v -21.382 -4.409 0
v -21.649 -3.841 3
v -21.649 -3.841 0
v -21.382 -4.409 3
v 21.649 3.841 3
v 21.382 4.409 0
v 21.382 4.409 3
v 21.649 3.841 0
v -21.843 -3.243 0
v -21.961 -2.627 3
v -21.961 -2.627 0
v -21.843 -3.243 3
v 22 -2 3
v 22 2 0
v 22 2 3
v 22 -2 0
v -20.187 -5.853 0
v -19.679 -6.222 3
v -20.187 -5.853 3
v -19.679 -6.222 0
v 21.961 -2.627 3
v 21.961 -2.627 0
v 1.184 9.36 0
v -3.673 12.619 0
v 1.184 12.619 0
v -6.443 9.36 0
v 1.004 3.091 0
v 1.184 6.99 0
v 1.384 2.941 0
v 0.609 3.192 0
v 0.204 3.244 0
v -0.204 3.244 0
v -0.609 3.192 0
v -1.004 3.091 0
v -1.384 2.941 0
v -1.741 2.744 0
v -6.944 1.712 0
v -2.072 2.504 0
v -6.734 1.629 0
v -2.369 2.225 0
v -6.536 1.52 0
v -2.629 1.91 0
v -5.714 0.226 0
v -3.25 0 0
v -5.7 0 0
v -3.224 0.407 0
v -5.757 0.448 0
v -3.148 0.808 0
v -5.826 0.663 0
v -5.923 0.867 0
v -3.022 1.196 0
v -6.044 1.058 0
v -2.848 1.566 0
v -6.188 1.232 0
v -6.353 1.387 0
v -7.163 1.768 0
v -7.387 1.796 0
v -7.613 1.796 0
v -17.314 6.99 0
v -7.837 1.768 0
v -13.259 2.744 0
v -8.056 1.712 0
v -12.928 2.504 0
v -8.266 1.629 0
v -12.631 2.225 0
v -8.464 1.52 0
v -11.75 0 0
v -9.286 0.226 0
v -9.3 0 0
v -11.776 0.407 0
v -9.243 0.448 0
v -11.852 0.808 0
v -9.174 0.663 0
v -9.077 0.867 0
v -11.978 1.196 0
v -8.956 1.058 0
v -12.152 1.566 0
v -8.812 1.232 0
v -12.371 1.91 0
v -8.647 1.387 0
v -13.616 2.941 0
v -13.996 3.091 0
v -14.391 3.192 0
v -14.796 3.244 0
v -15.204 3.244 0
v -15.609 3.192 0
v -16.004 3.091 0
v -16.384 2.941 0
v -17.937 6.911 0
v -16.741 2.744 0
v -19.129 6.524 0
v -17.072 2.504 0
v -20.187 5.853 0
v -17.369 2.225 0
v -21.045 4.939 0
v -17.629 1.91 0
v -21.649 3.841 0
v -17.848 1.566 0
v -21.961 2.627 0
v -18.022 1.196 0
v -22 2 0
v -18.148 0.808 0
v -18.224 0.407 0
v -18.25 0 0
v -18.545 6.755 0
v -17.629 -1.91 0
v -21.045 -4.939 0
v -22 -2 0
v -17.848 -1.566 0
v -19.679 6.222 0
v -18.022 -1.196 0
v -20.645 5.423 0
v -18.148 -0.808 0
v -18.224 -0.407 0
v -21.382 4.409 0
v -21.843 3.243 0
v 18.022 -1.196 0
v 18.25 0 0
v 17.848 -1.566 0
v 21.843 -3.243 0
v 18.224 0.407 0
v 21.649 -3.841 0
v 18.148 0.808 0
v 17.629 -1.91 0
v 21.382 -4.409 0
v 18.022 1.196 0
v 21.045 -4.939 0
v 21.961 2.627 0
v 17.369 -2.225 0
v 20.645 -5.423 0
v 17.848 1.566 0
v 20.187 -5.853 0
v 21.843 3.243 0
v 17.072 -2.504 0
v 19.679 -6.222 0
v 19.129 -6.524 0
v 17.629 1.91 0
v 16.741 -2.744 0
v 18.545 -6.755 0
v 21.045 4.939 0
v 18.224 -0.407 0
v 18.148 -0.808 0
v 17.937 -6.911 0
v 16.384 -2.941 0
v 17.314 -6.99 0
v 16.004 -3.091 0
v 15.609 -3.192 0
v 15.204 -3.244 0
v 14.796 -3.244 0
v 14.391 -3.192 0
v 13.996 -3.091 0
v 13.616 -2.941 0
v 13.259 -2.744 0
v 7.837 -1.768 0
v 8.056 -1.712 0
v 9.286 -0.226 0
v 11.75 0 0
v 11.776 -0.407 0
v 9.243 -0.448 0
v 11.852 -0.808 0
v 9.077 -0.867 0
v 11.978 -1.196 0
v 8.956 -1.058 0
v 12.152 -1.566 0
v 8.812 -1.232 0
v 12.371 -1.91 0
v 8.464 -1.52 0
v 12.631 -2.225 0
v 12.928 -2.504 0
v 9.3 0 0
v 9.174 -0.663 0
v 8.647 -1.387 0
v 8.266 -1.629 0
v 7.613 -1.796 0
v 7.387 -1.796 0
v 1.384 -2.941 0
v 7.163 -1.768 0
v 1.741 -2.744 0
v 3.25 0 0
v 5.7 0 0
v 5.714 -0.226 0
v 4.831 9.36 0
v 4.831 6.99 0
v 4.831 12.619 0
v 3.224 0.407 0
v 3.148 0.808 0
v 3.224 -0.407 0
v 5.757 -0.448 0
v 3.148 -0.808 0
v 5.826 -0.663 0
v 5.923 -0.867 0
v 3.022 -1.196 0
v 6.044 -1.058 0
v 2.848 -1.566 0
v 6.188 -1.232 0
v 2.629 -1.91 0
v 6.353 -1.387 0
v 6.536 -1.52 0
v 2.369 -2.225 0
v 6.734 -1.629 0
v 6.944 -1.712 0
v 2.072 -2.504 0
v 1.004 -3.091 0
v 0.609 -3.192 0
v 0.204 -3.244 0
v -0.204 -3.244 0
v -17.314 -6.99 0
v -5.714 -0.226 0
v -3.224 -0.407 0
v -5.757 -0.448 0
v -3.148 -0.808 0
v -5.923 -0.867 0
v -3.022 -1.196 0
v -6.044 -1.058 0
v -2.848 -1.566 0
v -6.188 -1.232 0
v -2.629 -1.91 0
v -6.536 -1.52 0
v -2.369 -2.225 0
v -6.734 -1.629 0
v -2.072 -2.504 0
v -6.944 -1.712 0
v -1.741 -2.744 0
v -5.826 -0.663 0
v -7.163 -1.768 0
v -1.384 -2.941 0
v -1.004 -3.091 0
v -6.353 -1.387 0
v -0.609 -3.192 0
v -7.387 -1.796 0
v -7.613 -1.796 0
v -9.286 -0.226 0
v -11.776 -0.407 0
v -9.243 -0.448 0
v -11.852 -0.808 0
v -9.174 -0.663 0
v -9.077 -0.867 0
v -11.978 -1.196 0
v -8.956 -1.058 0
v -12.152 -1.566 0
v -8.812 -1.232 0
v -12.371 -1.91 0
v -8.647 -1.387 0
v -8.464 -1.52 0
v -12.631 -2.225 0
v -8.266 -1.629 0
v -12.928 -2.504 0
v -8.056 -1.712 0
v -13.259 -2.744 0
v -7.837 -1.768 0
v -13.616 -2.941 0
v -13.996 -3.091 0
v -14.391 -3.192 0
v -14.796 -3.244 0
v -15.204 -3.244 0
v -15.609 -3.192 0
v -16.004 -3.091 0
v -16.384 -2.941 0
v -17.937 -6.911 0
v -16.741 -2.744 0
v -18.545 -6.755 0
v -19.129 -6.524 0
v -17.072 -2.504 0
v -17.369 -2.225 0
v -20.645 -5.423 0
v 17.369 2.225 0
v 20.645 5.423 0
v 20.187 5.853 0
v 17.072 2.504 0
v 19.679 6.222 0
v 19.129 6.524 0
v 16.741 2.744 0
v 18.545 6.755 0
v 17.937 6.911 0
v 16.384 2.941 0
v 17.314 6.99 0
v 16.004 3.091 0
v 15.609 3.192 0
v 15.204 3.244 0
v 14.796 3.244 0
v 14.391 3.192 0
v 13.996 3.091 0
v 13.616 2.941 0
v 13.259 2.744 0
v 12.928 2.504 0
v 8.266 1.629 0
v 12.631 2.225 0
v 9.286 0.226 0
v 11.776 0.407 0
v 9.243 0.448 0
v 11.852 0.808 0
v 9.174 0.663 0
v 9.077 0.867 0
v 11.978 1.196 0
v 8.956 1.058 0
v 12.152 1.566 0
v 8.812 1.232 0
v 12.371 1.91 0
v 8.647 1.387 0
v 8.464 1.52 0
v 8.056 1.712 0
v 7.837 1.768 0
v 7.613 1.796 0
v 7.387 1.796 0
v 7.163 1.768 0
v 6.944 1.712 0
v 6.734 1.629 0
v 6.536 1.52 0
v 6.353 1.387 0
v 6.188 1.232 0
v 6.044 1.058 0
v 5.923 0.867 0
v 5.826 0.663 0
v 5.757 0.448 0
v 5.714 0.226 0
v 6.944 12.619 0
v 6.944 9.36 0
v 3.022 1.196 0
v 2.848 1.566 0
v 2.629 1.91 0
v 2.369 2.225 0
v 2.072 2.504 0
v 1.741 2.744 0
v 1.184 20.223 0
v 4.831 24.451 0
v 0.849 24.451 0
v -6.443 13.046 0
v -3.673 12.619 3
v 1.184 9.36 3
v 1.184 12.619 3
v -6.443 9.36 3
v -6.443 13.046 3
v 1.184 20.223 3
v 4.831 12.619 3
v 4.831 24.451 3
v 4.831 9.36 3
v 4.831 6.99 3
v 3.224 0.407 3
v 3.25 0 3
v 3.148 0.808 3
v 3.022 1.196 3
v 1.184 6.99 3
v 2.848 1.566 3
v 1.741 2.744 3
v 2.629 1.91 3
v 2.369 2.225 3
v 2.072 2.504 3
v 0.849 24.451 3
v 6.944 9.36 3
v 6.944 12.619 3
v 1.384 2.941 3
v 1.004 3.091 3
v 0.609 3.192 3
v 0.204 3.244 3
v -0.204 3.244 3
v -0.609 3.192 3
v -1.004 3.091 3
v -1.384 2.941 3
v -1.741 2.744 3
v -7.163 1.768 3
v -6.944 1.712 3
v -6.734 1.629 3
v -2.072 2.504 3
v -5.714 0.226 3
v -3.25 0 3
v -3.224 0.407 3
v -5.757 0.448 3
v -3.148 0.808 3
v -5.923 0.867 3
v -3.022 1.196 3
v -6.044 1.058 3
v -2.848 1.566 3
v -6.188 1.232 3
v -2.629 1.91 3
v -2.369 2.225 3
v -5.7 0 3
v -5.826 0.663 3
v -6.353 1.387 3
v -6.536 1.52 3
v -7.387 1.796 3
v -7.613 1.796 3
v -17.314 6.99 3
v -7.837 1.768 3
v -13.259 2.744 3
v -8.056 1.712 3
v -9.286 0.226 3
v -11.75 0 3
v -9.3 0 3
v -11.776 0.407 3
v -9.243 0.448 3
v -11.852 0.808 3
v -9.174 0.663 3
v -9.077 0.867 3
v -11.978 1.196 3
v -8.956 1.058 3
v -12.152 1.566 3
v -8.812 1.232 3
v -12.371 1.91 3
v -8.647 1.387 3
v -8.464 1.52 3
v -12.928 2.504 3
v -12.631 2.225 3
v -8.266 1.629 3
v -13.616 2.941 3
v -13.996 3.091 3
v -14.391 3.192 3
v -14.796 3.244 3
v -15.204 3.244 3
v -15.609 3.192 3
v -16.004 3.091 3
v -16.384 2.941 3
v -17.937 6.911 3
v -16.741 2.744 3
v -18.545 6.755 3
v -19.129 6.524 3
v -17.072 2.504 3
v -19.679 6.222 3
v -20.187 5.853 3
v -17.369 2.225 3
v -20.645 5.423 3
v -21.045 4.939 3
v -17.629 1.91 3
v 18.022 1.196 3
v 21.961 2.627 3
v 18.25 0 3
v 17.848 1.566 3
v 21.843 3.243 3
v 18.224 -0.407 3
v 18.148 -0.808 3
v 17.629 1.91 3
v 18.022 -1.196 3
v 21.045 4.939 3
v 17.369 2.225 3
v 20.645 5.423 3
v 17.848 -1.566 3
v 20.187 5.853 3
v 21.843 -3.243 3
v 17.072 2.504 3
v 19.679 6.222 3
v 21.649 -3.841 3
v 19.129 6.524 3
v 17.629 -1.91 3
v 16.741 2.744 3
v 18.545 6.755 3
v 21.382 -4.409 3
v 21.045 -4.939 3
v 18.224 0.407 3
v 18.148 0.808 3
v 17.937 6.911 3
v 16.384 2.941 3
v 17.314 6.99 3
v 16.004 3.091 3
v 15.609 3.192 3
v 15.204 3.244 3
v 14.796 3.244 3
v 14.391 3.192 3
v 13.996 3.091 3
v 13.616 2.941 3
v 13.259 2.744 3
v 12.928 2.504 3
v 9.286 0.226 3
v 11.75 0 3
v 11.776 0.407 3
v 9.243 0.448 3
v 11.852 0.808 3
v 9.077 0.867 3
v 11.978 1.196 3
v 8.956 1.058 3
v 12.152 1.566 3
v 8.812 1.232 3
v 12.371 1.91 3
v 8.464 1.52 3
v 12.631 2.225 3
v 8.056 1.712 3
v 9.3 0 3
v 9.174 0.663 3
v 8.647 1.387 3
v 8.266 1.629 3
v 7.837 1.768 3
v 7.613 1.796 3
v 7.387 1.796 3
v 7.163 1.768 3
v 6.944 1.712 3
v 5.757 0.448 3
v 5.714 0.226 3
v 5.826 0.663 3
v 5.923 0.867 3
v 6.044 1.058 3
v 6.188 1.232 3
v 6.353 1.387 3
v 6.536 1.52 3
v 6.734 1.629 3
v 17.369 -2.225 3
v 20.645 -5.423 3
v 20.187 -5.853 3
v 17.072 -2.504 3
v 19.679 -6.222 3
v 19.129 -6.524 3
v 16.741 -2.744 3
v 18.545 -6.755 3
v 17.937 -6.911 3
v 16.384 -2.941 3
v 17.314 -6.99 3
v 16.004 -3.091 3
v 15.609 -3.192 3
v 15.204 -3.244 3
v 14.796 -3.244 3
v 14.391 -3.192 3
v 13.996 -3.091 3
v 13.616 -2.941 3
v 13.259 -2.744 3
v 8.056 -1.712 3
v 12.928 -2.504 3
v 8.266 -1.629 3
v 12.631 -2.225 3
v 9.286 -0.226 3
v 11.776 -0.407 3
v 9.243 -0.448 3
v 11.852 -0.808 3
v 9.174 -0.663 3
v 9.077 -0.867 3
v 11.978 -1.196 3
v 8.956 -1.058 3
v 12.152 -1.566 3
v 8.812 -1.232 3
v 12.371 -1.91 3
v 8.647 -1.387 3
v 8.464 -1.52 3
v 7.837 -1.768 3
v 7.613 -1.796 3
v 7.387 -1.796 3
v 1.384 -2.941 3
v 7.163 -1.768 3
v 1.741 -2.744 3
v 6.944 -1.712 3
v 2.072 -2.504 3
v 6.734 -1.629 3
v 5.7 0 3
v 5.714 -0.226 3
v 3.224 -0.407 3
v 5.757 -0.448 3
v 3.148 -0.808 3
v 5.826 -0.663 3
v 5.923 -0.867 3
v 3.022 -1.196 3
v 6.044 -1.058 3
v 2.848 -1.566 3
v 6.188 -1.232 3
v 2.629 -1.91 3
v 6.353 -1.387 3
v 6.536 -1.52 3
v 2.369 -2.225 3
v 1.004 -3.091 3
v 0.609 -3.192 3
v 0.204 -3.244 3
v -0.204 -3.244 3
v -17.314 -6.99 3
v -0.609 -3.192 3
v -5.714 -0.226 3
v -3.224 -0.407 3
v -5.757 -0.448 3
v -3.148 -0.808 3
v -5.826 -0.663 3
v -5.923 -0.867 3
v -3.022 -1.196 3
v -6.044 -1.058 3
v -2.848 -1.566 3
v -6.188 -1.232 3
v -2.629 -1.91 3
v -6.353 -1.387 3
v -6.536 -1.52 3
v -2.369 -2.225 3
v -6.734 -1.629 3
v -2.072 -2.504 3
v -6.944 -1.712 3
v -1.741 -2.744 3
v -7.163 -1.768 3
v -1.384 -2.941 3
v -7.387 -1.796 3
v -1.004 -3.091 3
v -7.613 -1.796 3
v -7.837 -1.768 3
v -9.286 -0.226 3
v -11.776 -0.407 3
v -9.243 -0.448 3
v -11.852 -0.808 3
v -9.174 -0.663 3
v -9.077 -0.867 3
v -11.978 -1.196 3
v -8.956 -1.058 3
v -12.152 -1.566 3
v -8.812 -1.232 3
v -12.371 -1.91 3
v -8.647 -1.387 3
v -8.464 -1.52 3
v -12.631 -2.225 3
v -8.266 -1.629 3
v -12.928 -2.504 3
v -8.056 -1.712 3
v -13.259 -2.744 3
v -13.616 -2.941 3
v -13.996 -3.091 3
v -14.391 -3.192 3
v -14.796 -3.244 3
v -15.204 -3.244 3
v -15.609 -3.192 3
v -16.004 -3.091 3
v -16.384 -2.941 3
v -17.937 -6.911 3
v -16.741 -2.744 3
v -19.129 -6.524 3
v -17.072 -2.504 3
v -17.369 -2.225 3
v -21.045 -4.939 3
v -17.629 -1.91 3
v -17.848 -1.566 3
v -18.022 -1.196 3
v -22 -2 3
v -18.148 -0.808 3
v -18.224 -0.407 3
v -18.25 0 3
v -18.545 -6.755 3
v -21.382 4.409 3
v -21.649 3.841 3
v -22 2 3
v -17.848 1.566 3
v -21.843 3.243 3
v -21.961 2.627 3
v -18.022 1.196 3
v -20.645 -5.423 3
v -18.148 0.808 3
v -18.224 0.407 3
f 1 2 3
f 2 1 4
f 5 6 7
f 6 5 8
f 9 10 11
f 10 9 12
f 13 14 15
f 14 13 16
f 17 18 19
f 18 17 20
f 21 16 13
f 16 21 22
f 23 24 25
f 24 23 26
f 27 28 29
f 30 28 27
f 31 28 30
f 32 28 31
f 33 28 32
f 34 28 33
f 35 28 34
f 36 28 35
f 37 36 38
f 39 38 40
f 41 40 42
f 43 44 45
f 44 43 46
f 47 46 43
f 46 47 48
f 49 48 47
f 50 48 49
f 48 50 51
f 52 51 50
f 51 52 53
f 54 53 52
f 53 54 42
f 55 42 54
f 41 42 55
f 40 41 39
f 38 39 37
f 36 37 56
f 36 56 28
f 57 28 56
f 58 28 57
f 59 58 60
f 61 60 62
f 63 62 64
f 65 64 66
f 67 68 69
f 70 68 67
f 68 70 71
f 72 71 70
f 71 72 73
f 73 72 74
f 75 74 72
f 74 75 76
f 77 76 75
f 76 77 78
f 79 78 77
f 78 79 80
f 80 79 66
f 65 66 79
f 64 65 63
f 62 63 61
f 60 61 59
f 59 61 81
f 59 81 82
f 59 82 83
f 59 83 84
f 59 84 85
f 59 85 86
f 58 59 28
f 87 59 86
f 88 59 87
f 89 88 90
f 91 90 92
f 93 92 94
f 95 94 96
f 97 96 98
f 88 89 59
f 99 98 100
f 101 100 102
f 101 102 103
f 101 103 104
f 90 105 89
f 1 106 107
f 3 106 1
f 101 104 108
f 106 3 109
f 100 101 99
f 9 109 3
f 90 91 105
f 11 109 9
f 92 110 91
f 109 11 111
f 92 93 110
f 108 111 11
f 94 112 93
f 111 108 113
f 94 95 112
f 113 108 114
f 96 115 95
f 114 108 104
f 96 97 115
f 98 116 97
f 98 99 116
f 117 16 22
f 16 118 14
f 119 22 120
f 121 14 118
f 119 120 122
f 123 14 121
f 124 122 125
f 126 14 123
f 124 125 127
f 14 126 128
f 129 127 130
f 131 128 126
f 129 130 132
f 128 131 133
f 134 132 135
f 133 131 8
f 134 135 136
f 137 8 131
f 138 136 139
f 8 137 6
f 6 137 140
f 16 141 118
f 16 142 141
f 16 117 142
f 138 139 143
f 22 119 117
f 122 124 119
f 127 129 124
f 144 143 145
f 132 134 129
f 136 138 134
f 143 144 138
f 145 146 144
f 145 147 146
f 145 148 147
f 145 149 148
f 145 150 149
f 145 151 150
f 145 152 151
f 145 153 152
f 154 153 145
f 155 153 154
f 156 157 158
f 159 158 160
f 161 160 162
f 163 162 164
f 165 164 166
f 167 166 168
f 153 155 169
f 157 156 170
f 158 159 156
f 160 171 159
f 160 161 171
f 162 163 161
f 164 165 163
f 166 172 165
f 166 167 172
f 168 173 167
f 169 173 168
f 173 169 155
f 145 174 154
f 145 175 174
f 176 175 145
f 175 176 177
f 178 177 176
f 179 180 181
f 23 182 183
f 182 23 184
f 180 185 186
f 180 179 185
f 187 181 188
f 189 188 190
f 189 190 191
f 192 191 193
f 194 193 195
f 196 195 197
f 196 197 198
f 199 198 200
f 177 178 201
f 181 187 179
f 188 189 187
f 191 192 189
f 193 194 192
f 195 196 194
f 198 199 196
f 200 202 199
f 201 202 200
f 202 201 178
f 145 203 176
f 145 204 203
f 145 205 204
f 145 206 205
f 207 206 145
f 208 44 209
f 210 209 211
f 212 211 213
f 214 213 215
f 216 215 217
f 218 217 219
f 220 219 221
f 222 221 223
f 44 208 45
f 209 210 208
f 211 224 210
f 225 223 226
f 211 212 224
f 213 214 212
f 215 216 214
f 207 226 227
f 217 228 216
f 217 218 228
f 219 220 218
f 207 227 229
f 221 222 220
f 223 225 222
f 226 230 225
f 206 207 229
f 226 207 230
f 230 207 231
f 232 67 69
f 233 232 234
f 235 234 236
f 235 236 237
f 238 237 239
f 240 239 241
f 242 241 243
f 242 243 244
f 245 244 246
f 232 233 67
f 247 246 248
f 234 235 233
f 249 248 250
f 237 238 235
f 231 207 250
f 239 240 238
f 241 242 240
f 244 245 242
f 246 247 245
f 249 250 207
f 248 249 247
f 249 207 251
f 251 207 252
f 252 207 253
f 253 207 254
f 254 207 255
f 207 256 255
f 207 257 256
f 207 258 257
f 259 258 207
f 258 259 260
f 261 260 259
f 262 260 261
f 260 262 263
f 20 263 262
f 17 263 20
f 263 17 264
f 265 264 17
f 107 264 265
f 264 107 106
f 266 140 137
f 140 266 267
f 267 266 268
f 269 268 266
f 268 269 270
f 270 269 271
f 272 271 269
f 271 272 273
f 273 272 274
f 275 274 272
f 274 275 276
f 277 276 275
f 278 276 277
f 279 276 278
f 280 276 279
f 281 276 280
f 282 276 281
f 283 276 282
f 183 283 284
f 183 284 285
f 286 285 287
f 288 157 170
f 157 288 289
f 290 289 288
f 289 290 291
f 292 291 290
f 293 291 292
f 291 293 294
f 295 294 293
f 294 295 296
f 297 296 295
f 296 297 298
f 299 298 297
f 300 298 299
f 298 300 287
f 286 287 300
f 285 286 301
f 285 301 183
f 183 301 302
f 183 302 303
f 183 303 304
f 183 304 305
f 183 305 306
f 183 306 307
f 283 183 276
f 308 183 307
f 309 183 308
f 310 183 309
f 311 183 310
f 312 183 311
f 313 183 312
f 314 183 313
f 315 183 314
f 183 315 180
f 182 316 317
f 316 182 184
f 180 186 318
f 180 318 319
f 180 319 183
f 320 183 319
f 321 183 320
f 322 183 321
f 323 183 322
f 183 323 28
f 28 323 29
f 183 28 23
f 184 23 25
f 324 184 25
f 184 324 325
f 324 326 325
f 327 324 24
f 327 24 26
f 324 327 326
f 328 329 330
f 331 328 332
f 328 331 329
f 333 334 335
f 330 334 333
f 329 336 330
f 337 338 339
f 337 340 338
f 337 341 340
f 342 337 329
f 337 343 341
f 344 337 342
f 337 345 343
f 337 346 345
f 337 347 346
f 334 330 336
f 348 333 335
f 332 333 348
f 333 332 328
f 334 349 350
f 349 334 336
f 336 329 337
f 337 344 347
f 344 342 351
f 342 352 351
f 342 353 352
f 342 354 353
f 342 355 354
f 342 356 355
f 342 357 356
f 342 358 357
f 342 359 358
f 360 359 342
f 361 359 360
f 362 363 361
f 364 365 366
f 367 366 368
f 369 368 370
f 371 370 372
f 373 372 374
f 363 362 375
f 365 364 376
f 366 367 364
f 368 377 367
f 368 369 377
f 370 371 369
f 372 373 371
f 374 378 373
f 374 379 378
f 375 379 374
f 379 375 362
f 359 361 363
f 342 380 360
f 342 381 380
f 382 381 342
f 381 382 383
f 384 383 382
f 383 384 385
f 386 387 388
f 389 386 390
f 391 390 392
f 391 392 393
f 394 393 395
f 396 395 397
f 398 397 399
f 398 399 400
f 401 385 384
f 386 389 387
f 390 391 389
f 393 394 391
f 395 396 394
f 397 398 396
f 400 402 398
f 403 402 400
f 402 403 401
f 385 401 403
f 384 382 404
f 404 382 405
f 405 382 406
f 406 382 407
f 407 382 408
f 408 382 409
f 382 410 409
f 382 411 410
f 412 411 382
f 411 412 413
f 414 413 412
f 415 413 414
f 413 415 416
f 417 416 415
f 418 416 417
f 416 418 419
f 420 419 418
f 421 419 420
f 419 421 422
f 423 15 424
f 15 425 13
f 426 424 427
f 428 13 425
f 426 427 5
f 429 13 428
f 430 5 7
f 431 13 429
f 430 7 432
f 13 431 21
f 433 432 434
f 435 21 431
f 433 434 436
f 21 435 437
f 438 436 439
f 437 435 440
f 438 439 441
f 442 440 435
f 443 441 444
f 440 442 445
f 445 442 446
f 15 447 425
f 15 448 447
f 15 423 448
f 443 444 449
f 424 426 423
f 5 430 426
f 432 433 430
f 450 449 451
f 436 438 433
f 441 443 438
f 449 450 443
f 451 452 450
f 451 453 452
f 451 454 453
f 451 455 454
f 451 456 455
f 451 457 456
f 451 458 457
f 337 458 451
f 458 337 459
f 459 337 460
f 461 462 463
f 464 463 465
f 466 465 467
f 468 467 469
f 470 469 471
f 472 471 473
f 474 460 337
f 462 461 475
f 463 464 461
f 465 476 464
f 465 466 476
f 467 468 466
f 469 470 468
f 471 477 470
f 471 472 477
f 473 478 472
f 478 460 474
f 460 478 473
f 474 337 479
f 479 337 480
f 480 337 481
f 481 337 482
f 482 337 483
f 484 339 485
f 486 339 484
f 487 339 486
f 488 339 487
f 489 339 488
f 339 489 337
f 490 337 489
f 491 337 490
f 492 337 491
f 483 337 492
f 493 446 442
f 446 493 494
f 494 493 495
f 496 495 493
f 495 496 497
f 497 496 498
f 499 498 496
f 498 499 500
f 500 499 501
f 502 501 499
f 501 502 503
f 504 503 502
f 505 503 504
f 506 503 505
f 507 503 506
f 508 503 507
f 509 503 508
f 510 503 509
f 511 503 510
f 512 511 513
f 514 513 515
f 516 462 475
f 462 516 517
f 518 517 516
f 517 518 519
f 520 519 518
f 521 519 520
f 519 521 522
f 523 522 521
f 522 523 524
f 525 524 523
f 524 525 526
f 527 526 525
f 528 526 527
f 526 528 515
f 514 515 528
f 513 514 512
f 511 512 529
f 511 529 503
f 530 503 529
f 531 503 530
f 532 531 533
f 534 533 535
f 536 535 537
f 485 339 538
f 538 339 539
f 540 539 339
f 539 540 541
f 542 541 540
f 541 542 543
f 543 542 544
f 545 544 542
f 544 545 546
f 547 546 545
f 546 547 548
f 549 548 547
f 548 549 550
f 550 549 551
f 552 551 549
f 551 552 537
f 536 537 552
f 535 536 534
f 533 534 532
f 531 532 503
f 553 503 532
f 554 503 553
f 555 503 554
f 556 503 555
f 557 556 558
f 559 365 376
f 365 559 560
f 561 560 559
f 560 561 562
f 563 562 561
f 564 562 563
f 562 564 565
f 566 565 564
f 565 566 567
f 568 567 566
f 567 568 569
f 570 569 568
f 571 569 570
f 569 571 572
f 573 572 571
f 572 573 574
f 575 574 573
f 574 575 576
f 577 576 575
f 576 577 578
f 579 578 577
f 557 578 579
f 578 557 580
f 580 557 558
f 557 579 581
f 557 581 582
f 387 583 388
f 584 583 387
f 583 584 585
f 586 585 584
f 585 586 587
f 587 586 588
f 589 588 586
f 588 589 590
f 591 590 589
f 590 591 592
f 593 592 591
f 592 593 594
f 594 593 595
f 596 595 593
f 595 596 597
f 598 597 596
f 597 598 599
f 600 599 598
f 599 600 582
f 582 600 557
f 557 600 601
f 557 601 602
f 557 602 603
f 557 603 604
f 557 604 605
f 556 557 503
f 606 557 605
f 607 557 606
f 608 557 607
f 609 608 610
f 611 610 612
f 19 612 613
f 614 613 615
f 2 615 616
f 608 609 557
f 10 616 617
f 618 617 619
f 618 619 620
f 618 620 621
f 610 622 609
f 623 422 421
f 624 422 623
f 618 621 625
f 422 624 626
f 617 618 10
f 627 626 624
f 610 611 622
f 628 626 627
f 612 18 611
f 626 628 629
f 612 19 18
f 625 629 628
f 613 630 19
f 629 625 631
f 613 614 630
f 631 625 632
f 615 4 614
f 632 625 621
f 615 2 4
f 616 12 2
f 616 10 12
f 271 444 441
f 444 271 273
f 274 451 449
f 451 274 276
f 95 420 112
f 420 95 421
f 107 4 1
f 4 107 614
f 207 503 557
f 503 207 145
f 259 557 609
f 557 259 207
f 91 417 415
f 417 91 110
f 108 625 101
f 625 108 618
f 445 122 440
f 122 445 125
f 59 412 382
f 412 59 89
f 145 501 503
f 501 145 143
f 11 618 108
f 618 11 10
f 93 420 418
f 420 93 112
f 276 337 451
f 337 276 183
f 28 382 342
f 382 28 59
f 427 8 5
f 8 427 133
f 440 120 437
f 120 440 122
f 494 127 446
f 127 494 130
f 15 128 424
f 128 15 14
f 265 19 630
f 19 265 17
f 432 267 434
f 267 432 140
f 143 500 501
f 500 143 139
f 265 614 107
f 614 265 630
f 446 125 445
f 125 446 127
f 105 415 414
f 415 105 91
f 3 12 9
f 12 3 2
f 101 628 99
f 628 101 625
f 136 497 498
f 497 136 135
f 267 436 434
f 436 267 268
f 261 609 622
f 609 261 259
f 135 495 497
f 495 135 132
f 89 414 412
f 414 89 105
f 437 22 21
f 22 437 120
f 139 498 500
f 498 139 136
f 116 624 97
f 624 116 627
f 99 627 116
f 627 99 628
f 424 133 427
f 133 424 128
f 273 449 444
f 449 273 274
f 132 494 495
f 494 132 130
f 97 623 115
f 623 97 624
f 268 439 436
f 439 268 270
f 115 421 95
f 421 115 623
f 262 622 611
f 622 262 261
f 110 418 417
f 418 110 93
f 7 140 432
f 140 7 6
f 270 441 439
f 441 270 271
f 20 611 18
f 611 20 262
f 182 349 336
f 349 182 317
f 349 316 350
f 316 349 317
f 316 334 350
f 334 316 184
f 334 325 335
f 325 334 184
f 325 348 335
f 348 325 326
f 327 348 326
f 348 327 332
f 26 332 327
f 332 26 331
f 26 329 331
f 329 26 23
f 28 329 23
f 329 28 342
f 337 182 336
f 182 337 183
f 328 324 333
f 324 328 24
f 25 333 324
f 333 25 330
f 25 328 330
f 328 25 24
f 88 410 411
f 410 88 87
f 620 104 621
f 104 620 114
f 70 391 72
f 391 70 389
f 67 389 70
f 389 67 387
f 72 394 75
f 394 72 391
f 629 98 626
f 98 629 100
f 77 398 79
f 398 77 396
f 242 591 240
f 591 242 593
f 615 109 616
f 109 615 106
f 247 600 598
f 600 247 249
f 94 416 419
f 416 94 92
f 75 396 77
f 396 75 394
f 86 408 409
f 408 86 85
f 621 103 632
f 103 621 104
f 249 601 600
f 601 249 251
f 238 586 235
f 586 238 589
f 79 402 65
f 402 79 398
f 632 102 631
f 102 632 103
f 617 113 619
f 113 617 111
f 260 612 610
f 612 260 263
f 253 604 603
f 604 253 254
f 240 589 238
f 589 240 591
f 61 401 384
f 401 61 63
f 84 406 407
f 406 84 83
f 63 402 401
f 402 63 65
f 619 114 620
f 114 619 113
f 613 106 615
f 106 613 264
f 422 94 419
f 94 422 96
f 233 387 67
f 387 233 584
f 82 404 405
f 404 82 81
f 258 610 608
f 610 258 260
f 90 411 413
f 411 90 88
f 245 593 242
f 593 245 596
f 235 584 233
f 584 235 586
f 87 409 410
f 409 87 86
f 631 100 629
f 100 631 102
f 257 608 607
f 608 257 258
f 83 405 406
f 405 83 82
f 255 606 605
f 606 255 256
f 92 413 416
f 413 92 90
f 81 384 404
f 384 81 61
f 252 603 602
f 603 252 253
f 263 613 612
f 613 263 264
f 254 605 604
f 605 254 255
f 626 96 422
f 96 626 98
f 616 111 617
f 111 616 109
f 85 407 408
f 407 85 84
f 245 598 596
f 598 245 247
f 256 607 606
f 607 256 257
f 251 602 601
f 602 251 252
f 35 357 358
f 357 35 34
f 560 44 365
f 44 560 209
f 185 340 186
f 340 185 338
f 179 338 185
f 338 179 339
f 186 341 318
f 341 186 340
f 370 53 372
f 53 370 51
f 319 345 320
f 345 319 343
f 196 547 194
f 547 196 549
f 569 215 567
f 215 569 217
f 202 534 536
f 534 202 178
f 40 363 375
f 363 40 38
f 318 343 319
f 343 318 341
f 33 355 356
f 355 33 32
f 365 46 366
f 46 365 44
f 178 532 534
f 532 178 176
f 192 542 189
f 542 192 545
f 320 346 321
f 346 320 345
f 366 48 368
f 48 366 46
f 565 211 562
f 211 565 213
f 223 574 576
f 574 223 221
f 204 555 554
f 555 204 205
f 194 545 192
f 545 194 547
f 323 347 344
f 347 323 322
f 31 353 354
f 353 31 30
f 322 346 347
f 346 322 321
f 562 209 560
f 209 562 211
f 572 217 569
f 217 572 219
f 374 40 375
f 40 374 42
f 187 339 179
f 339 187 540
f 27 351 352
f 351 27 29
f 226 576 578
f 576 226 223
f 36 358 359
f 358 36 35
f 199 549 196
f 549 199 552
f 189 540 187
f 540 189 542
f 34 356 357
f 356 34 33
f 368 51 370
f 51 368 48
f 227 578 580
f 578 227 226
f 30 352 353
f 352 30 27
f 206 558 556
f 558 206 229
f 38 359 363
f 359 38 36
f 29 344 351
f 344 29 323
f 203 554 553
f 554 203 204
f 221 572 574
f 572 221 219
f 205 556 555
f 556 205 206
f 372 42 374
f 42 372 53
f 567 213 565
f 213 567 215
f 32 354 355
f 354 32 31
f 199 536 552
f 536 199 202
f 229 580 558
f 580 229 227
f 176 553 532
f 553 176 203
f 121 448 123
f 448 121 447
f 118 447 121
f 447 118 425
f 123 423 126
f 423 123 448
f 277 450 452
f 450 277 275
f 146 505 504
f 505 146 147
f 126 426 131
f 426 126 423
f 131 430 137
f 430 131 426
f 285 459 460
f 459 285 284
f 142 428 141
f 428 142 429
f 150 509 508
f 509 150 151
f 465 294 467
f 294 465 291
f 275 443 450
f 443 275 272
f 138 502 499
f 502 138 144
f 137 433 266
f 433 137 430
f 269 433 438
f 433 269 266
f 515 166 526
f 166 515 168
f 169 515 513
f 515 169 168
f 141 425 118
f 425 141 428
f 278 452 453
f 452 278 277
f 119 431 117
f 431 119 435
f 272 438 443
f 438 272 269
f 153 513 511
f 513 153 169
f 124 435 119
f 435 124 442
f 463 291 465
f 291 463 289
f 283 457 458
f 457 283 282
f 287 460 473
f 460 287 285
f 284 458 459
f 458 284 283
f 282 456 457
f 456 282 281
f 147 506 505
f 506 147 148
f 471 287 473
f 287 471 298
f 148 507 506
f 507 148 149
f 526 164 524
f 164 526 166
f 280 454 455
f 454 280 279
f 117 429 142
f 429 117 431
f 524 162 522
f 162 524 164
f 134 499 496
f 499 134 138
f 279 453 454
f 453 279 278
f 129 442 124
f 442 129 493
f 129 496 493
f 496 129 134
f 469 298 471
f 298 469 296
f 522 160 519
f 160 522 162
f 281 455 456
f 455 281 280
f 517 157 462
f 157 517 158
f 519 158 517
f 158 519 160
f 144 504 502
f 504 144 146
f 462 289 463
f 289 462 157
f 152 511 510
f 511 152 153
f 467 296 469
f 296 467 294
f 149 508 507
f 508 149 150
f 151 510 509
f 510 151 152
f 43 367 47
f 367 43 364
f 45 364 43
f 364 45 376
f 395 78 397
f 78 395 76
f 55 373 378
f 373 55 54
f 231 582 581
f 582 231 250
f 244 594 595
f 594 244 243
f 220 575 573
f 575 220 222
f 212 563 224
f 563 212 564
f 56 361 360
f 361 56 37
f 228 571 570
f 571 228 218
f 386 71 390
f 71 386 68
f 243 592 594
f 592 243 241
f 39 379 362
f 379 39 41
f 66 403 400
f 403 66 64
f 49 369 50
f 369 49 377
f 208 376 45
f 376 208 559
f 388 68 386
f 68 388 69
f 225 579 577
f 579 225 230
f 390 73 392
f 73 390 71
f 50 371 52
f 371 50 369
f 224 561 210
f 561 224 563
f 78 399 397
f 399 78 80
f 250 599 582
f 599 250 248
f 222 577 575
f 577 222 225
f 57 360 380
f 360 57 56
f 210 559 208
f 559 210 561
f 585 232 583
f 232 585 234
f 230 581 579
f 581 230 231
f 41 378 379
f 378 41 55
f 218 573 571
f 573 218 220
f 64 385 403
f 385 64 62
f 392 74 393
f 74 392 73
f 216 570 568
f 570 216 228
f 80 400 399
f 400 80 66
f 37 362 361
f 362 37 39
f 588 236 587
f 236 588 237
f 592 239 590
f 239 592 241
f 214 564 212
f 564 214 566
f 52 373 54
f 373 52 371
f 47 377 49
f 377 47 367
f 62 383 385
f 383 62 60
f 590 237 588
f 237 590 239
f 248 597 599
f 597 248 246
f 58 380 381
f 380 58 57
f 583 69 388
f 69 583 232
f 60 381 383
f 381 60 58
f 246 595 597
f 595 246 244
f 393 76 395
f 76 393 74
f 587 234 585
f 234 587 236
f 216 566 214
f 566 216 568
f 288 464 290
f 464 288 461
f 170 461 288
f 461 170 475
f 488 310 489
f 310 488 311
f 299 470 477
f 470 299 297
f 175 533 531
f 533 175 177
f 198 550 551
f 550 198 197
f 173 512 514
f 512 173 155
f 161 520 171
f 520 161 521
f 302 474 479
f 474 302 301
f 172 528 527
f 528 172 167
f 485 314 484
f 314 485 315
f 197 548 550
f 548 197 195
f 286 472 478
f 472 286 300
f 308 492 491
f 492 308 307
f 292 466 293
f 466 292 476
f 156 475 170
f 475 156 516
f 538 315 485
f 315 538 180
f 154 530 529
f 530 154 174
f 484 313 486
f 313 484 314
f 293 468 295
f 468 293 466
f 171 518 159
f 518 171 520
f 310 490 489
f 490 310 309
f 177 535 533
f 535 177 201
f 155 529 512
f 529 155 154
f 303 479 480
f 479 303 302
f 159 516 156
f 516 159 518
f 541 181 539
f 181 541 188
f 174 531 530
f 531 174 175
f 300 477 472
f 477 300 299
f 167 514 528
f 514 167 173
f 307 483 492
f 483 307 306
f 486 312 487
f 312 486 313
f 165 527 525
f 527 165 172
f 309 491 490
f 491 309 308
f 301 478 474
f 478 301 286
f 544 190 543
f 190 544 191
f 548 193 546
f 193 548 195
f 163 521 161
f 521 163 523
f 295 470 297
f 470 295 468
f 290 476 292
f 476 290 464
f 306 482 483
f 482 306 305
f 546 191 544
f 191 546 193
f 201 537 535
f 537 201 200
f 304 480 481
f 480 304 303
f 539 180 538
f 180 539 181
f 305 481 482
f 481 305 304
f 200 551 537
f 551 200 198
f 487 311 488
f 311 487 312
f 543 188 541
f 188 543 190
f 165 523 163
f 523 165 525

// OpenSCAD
$fn = 50;


difference() {
	union() {
		hull() {
			translate(v = [-17.0000000000, 2.0000000000, 0]) {
				cylinder(h = 3, r = 5);
			}
			translate(v = [17.0000000000, 2.0000000000, 0]) {
				cylinder(h = 3, r = 5);
			}
			translate(v = [-17.0000000000, -2.0000000000, 0]) {
				cylinder(h = 3, r = 5);
			}
			translate(v = [17.0000000000, -2.0000000000, 0]) {
				cylinder(h = 3, r = 5);
			}
		}
		translate(v = [0, 24, 0]) {
			linear_extrude(height = 3) {
				text(font = "DejaVu Sans Mono:style=Bold", halign = "center", size = 19.0000000000, text = "4", valign = "top");
			}
		}
	}
	union() {
		translate(v = [-15.0000000000, 0.0000000000, 0]) {
			translate(v = [0, 0, -100]) {
				cylinder(h = 200, r = 3.2500000000);
			}
		}
		translate(v = [0, 0, -100]) {
			cylinder(h = 200, r = 3.2500000000);
		}
		translate(v = [15.0000000000, 0.0000000000, 0]) {
			translate(v = [0, 0, -100]) {
				cylinder(h = 200, r = 3.2500000000);
			}
		}
		translate(v = [-15.0000000000, 0.0000000000, 0]) {
			translate(v = [0, 0, -100]) {
				cylinder(h = 200, r = 1.8000000000);
			}
		}
		translate(v = [-7.5000000000, 0.0000000000, 0]) {
			translate(v = [0, 0, -100]) {
				cylinder(h = 200, r = 1.8000000000);
			}
		}
		translate(v = [0, 0, -100]) {
			cylinder(h = 200, r = 1.8000000000);
		}
		translate(v = [7.5000000000, 0.0000000000, 0]) {
			translate(v = [0, 0, -100]) {
				cylinder(h = 200, r = 1.8000000000);
			}
		}
		translate(v = [15.0000000000, 0.0000000000, 0]) {
			translate(v = [0, 0, -100]) {
				cylinder(h = 200, r = 1.8000000000);
			}
		}
	}
}
